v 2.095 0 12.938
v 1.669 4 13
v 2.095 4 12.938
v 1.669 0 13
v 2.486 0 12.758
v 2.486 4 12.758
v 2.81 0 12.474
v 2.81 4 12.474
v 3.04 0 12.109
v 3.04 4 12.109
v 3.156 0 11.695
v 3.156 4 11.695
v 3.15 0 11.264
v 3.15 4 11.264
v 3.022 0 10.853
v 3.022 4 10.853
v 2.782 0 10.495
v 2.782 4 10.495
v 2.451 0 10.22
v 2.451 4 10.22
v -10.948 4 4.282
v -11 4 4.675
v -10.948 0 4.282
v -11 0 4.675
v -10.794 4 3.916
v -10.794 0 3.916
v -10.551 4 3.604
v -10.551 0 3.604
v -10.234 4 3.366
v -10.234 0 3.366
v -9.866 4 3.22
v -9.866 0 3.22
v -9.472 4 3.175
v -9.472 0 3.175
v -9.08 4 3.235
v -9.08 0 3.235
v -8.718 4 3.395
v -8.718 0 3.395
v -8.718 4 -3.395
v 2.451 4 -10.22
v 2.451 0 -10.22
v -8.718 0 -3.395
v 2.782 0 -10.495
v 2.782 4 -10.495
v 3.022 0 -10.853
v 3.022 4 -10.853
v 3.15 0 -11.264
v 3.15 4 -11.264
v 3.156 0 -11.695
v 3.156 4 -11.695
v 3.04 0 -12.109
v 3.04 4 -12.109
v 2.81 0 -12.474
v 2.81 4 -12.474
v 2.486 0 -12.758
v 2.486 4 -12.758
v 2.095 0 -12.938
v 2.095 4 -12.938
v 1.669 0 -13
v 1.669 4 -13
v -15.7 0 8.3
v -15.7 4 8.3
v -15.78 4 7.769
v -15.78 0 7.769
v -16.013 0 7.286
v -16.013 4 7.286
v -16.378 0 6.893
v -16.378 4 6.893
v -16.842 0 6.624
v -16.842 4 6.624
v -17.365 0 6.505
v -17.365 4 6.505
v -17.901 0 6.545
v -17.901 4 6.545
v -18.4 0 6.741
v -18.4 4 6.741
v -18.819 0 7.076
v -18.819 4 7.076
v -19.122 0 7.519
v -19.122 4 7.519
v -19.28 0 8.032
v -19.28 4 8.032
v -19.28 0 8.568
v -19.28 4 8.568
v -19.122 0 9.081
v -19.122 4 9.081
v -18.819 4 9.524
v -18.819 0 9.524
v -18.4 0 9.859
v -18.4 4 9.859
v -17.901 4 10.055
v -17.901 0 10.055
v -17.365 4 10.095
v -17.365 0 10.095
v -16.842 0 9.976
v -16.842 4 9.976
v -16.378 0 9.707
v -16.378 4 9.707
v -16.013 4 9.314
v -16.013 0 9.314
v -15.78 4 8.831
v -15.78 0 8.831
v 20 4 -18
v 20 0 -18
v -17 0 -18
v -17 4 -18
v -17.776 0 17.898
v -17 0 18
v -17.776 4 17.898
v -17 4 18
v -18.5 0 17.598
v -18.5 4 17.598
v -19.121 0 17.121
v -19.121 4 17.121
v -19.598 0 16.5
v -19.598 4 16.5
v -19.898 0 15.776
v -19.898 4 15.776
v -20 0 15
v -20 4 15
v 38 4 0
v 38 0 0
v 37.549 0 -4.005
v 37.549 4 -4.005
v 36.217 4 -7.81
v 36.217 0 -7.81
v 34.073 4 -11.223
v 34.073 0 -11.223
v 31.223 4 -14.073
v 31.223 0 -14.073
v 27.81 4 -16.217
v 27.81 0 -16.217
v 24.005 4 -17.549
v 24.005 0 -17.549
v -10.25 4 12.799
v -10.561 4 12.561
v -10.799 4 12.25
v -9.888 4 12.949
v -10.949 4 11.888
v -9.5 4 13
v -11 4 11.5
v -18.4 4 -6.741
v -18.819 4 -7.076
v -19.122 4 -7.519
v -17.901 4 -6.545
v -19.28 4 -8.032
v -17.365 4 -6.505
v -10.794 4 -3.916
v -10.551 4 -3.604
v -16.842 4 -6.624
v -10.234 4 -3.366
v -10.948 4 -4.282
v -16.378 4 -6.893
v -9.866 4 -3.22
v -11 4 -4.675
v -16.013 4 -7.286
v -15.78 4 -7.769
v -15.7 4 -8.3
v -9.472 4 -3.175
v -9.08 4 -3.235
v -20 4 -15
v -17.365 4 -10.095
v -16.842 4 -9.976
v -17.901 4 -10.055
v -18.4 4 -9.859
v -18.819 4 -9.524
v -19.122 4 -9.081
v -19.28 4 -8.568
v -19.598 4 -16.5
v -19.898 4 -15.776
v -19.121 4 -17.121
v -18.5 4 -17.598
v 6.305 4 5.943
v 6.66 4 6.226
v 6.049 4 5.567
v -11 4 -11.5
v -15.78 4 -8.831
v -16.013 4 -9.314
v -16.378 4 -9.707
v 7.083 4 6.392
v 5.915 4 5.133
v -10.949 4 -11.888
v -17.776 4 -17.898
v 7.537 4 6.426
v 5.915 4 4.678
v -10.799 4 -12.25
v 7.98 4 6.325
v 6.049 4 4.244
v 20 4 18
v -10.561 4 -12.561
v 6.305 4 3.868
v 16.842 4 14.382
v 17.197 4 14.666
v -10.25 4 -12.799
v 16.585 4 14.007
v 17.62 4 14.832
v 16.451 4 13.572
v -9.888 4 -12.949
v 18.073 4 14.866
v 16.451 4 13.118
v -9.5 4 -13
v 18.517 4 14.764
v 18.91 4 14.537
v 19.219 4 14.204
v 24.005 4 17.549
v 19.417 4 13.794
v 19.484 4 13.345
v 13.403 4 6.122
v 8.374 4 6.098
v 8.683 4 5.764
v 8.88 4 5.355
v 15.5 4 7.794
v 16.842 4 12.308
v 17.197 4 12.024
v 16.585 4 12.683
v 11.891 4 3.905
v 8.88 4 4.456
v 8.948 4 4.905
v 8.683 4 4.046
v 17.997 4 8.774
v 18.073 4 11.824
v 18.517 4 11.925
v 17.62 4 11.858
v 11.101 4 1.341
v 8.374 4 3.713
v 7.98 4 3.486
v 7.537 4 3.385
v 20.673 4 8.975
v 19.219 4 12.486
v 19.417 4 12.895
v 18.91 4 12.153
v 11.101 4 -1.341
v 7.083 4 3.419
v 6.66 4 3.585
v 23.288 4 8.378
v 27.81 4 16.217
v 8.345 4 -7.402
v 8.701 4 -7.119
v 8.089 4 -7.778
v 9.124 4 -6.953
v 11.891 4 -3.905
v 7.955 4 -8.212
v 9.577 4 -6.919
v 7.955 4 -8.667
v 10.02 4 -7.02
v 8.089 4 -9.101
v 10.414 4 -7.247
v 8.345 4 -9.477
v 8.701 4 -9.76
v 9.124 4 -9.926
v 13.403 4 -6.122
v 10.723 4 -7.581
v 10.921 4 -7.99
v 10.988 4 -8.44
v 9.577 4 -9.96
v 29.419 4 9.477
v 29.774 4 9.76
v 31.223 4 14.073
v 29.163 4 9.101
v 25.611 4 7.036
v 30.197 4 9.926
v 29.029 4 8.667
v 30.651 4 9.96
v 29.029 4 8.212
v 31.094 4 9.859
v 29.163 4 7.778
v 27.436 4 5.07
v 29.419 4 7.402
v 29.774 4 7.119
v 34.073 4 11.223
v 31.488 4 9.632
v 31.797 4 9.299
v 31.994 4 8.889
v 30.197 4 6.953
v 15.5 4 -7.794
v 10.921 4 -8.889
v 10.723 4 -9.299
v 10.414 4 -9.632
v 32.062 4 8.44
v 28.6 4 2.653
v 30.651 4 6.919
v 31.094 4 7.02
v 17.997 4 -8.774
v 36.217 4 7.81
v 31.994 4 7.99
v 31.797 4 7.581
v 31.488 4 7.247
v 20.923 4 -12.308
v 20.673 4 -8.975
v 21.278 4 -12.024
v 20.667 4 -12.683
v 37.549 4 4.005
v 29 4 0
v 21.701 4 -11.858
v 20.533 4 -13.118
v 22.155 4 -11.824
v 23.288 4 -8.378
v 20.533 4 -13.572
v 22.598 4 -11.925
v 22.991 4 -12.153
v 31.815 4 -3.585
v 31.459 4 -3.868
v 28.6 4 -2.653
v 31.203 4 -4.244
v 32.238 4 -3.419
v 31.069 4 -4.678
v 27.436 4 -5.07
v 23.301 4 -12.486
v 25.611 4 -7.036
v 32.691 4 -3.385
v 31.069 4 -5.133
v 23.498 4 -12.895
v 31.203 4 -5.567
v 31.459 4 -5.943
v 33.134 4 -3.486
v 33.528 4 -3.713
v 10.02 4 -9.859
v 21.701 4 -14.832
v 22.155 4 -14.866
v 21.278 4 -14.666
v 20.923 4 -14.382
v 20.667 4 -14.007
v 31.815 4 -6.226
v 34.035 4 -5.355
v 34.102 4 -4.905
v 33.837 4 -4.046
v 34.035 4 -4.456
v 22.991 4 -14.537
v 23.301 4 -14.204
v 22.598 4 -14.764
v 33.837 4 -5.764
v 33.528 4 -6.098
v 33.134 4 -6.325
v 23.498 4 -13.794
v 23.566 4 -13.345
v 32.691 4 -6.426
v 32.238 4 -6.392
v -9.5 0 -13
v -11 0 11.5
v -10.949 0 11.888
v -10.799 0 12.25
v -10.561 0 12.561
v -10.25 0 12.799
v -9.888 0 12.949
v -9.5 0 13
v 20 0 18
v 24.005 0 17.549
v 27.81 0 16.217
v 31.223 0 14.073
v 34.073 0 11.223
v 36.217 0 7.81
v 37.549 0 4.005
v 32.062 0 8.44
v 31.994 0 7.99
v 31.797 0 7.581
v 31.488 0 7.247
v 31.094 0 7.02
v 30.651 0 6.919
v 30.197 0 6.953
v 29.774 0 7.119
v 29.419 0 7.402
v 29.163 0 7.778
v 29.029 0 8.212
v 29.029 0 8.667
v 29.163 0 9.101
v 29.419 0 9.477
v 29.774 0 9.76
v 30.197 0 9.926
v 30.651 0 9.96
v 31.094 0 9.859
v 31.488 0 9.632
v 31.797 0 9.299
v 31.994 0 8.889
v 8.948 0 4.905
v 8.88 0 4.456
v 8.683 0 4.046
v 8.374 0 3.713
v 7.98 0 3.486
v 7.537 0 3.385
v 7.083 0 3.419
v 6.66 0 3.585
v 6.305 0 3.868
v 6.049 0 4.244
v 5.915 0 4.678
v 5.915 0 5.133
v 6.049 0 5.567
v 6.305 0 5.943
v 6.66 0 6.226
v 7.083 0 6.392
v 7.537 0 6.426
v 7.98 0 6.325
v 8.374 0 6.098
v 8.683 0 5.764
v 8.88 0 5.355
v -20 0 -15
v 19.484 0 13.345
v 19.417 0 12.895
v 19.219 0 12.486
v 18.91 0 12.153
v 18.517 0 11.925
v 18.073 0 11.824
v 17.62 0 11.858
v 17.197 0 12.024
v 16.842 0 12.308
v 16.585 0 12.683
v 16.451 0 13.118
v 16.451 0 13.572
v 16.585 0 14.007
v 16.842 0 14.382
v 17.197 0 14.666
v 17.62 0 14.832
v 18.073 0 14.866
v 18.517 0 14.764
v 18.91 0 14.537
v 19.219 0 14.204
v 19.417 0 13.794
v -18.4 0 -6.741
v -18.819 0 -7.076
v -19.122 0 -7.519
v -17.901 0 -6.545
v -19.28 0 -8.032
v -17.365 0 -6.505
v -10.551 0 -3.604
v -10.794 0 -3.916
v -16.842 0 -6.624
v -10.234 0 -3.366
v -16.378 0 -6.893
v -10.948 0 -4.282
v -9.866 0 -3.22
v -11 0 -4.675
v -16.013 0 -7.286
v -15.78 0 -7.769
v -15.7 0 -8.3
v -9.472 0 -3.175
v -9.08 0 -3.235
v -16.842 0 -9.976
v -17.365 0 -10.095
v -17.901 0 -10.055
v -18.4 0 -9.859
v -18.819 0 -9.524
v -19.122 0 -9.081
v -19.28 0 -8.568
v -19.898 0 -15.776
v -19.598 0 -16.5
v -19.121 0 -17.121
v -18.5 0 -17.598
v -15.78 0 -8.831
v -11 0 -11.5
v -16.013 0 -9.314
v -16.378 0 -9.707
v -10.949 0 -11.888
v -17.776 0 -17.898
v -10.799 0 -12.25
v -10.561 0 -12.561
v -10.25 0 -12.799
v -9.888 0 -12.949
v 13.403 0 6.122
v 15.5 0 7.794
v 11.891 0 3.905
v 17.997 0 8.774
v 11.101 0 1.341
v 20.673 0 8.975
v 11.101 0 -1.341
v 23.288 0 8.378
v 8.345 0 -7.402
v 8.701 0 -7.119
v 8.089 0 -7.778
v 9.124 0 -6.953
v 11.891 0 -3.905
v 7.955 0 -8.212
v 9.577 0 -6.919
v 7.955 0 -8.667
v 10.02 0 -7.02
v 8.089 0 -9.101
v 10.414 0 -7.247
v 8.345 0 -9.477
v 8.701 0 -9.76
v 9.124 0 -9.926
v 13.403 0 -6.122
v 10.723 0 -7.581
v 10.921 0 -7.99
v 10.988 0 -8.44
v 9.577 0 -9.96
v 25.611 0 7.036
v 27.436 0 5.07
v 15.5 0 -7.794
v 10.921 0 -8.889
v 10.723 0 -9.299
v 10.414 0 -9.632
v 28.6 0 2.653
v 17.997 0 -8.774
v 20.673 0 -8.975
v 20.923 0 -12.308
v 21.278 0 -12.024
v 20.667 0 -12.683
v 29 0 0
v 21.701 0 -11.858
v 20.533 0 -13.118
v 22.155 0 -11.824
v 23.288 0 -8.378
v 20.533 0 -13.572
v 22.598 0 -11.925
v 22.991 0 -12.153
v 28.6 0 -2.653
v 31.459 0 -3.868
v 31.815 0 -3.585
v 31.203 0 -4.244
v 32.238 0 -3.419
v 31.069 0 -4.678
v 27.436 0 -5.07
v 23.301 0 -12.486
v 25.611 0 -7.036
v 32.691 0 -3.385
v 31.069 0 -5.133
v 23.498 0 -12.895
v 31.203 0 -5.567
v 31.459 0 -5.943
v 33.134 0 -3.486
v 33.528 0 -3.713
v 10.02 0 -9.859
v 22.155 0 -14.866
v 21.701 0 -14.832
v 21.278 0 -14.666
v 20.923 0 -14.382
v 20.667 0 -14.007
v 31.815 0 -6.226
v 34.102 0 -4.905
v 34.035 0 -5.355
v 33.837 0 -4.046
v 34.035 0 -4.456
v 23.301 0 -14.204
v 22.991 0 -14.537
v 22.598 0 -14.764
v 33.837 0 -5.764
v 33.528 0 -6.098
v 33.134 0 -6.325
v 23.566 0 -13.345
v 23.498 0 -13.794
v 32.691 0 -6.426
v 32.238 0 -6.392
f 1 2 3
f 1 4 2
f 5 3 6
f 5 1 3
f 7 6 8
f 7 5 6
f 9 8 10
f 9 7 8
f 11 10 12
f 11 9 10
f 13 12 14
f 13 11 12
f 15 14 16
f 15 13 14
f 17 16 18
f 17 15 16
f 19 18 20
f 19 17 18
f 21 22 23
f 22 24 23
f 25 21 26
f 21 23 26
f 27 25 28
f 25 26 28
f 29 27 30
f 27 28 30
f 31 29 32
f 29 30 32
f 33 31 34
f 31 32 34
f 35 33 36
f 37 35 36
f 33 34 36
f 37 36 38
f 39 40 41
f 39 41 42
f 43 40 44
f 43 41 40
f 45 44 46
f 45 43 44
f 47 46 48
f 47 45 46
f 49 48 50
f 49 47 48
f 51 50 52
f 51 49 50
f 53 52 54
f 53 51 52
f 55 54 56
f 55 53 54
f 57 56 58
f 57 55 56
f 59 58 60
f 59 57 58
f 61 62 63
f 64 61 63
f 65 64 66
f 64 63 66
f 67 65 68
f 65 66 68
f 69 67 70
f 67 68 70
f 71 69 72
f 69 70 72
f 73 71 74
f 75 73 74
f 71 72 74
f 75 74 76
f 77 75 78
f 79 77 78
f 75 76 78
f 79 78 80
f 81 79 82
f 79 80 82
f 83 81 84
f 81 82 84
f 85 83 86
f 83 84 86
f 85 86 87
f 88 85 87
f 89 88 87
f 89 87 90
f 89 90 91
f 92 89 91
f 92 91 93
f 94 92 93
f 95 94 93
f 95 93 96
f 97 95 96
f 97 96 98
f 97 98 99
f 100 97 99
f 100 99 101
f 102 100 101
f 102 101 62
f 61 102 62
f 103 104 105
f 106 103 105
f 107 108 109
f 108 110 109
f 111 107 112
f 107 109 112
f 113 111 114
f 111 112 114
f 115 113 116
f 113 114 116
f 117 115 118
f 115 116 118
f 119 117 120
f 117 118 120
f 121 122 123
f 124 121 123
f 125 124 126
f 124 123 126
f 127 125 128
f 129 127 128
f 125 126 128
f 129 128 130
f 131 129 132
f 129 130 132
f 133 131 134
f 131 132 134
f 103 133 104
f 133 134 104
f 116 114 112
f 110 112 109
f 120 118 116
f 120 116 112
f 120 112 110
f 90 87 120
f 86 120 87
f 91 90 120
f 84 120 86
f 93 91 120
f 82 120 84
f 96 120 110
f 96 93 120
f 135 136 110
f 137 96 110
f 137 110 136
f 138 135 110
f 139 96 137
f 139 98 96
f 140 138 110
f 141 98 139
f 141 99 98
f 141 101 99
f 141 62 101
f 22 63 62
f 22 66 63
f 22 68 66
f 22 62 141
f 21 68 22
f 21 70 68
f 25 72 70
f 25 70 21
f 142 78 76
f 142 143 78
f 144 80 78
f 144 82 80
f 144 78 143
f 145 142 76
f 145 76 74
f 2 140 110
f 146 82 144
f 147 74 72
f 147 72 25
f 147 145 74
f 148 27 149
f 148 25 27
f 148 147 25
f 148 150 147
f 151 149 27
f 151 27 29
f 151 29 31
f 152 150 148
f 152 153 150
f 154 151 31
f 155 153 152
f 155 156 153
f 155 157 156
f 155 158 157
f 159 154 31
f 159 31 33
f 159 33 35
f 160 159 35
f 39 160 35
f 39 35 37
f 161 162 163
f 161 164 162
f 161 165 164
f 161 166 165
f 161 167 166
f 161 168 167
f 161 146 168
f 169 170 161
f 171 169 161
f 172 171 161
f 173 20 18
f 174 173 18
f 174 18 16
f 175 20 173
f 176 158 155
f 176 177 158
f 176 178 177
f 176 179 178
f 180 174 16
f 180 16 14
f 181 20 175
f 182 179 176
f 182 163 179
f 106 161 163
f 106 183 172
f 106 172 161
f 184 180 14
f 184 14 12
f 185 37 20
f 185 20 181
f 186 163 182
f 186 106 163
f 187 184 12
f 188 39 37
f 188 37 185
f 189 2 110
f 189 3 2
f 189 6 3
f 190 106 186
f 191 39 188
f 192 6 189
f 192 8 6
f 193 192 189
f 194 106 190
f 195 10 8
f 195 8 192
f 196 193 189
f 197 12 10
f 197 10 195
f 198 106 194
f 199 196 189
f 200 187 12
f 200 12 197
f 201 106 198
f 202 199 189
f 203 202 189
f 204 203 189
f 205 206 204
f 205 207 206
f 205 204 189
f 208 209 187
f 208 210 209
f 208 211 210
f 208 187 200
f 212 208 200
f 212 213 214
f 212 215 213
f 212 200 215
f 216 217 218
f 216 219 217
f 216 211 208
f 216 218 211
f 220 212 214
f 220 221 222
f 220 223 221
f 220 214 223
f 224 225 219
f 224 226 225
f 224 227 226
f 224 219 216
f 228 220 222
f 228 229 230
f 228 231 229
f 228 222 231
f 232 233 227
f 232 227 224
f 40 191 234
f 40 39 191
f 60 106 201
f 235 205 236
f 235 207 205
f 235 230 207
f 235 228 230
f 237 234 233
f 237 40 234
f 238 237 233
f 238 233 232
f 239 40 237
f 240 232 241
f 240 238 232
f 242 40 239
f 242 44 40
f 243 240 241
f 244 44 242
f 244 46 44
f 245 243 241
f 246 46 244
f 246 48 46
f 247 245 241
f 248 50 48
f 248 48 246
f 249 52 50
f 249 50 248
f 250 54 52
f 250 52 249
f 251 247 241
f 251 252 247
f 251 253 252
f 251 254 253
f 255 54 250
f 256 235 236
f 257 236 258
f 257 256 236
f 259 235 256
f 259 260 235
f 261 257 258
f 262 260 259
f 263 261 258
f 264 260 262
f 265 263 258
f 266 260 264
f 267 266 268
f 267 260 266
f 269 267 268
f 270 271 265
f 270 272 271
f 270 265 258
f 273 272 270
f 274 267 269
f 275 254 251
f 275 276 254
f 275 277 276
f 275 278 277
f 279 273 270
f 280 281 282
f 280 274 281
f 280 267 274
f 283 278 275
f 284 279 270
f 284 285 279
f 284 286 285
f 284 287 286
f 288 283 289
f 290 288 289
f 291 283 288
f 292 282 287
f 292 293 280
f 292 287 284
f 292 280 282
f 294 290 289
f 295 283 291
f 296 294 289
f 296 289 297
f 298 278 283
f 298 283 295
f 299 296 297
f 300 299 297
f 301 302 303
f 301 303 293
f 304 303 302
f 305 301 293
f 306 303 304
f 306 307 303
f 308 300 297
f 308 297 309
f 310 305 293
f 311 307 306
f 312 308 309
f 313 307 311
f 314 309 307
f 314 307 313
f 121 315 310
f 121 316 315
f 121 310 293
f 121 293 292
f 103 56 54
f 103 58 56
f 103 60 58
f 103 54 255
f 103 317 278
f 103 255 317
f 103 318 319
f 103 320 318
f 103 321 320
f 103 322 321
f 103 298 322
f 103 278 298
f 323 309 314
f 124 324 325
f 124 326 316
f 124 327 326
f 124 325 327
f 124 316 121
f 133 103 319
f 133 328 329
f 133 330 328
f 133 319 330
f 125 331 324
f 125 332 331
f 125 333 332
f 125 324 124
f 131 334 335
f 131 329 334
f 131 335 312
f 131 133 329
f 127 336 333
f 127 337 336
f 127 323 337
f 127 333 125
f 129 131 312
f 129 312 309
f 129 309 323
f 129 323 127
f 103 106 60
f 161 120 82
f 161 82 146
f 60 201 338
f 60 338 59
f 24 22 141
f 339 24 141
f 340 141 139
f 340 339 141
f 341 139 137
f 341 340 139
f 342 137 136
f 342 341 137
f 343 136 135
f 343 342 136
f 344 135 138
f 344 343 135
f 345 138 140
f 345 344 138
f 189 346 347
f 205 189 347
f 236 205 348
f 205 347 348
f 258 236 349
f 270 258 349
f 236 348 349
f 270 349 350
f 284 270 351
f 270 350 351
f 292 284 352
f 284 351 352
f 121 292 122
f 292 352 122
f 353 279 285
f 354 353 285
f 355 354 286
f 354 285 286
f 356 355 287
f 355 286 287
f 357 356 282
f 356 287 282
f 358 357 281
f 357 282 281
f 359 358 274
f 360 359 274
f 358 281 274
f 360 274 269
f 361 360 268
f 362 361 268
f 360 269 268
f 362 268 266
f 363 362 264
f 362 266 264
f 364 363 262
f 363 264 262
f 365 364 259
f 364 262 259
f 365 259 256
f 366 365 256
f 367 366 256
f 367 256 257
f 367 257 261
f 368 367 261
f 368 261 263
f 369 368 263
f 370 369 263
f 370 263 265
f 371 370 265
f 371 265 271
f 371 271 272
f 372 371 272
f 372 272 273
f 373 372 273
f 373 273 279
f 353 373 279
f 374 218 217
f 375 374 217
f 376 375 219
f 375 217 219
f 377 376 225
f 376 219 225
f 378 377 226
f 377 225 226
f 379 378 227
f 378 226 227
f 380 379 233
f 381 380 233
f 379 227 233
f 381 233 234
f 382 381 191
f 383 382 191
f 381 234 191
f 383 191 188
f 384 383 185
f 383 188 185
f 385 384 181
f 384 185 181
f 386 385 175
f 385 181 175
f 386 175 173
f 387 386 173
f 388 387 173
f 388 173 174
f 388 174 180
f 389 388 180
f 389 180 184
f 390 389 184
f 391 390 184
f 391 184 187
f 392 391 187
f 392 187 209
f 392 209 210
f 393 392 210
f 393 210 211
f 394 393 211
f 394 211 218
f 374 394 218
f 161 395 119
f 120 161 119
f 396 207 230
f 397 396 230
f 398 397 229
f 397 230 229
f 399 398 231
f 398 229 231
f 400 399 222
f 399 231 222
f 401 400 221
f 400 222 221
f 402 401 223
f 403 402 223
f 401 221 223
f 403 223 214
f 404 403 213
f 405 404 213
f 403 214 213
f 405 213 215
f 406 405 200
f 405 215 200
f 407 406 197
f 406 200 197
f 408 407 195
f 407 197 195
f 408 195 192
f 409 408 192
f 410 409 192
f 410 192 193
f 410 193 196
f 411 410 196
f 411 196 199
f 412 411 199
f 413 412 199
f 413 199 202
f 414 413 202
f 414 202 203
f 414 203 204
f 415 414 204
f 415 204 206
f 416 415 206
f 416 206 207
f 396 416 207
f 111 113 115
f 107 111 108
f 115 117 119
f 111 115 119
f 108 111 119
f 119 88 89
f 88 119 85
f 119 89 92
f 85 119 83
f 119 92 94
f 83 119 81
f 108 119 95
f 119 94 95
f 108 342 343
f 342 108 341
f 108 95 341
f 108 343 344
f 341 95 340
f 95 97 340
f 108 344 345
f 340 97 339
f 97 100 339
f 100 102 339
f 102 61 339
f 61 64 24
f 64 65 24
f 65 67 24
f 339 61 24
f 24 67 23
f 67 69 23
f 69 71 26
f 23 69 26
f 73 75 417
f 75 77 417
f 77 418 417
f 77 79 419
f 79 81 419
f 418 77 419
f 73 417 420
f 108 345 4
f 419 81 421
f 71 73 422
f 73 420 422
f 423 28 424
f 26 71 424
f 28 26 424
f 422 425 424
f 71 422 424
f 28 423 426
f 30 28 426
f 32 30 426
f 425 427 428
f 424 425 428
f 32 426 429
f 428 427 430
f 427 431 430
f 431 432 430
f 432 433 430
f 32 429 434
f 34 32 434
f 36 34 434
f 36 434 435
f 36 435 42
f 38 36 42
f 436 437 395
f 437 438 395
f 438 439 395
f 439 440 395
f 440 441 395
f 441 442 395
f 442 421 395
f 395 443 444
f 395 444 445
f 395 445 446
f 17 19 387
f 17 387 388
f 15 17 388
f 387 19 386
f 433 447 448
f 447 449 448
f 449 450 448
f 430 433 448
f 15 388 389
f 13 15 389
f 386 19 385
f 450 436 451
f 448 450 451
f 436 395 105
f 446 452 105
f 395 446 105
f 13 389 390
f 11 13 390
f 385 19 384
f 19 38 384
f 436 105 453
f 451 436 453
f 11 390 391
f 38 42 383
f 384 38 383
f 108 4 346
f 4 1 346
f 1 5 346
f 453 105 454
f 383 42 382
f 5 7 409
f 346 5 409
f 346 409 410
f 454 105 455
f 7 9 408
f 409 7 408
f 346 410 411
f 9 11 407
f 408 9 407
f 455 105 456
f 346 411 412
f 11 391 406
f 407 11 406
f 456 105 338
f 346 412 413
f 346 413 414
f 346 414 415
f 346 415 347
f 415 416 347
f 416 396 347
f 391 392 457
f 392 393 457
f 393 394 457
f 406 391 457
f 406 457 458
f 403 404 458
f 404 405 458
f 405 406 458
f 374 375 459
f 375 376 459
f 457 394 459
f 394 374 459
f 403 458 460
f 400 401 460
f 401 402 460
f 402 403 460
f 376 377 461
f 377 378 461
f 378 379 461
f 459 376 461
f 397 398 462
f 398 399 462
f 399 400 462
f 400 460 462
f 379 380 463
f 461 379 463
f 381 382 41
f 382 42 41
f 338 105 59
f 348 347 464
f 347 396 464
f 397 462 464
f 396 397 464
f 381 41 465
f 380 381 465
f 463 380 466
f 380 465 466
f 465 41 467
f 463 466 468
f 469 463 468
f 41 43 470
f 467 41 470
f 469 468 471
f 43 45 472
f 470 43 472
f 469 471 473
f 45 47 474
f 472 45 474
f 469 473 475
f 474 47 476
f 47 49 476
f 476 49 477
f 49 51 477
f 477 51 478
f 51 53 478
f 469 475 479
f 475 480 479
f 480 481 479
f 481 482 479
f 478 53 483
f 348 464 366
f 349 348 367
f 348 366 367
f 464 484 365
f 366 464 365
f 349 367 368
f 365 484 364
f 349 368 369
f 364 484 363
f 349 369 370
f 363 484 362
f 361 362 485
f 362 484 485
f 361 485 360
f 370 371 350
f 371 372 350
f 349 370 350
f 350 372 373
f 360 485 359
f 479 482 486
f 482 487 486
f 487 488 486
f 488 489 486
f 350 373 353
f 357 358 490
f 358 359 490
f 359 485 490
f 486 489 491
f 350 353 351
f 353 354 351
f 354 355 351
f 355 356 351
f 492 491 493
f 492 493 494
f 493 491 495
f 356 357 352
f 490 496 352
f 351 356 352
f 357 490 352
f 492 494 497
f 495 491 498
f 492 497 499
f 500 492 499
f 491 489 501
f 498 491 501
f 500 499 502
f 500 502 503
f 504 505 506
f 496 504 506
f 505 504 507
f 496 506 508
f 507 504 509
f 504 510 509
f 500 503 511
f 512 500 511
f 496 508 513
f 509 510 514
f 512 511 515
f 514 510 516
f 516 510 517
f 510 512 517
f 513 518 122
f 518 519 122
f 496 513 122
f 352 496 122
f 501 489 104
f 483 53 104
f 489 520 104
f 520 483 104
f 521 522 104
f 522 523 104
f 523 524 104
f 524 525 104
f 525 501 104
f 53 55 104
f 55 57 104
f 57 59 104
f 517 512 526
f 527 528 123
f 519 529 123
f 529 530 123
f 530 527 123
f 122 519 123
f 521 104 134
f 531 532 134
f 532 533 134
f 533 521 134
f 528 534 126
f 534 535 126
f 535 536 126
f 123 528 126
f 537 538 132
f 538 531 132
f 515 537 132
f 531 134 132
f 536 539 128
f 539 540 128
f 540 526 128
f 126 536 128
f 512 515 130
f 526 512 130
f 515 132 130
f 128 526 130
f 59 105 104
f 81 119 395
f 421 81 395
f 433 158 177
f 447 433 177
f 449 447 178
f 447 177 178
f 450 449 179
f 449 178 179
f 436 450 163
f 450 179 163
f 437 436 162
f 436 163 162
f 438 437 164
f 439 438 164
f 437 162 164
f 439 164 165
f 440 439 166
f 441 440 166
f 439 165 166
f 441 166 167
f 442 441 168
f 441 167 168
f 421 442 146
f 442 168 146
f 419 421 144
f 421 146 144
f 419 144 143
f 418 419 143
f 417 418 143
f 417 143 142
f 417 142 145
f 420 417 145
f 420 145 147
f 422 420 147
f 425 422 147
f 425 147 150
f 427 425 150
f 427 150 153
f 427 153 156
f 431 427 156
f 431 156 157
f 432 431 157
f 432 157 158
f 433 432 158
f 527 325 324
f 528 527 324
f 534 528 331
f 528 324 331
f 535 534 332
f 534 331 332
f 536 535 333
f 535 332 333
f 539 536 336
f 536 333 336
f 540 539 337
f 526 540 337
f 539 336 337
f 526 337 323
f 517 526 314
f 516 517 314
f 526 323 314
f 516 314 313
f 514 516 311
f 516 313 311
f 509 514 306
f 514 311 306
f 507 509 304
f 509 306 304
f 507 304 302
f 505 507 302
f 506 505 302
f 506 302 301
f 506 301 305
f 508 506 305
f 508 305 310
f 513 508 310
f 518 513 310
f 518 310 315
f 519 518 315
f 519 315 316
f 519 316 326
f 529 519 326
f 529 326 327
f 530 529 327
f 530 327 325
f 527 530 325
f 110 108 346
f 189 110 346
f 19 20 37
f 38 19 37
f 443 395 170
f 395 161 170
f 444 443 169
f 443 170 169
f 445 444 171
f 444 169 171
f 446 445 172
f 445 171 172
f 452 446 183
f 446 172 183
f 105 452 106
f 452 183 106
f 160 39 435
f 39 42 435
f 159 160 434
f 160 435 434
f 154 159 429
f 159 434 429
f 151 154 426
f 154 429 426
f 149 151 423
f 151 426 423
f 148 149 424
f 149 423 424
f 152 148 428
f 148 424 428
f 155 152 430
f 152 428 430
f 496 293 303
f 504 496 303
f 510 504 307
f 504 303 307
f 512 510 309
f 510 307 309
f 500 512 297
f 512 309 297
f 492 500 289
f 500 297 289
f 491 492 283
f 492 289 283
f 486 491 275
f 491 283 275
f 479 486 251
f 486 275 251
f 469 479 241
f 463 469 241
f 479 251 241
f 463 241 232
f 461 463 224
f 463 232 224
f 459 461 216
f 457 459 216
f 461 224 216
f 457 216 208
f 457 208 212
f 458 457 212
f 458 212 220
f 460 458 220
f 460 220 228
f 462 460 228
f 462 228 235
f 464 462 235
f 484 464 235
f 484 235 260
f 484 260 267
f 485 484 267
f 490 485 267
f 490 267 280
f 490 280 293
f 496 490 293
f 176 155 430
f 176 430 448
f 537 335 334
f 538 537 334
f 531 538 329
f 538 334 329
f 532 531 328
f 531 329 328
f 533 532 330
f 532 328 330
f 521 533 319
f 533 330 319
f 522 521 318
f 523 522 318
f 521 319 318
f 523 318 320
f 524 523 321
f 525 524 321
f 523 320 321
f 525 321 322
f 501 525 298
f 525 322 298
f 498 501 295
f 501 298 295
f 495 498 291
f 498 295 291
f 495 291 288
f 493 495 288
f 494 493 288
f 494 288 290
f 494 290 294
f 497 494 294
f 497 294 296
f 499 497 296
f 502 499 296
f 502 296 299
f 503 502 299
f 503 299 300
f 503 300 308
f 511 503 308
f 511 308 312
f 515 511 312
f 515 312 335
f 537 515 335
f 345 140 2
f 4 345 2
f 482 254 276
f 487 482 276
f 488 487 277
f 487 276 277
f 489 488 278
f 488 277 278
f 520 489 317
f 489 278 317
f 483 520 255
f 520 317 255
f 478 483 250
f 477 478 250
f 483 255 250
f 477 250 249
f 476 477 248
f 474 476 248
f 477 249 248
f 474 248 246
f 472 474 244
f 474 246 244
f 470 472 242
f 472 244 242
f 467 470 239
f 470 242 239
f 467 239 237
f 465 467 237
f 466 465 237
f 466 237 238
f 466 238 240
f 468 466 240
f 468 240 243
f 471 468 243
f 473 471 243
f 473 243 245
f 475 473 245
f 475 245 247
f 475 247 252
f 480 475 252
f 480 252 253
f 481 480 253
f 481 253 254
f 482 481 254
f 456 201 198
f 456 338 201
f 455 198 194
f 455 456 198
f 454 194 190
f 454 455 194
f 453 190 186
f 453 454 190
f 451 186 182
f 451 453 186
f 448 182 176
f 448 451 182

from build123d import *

# Parameters (mm, degrees)
EXTRUDE_1_DEPTH        = 4
SKETCH_2_R             = 1.525
CUT_EXTRUDE_1_DEPTH    = 5
FILLET_1_R             = 3
SKETCH_3_R             = 1.8
CUT_EXTRUDE_5_DEPTH    = 5
CUT_EXTRUDE_3_DEPTH    = 5
FILLET_2_R             = 1.5
FILLET_2_OF_MIRROR_1_R = 1.5
SKETCH_5_R             = 9
CUT_EXTRUDE_4_DEPTH    = 5


with BuildPart() as part:
    # 草图1 → 凸台-拉伸1 (new body)
    with BuildSketch(Plane(origin=(0, 0, 0), x_dir=(1, 0, 0), z_dir=(0, 1, 0))):
        with BuildLine():
            Line((-20, 18), (-20, -18))
            Line((-20, -18), (20, -18))
            ThreePointArc((20, -18), (2, 0), (20, 18))
            Line((20, 18), (-20, 18))
        make_face()
        with BuildLine():
            ThreePointArc((20, 18), (2, 0), (20, -18))
            Line((20, -18), (20, 18))
        make_face()
        with BuildLine():
            Line((20, 18), (20, -18))
            ThreePointArc((20, -18), (32.727922061, -12.727922061), (38, 0))
            ThreePointArc((38, 0), (32.727922061, 12.727922061), (20, 18))
        make_face()
    extrude(amount=EXTRUDE_1_DEPTH)

    # 草图2 → 切除-拉伸1 (cut, through all)
    with BuildSketch(Plane(origin=(0, 4, 0), x_dir=(1, 0, 0), z_dir=(0, 1, 0))):
        with Locations((9.463257492, 8.439612392)):
            Circle(SKETCH_2_R)
        with Locations((7.422710017, -4.905280489)):
            Circle(SKETCH_2_R)
        with Locations((30.536742508, -8.439612392)):
            Circle(SKETCH_2_R)
        with Locations((17.959452524, -13.344892881)):
            Circle(SKETCH_2_R)
        with Locations((32.577289983, 4.905280489)):
            Circle(SKETCH_2_R)
        with Locations((22.040547476, 13.344892881)):
            Circle(SKETCH_2_R)
    extrude(amount=-CUT_EXTRUDE_1_DEPTH, mode=Mode.SUBTRACT)

    # 圆角1
    fillet_1_edges = [part.edges().sort_by_distance(p)[0] for p in [
        (-20, 2, 18),
        (-20, 2, -18),
    ]]
    fillet(fillet_1_edges, radius=FILLET_1_R)

    # 草图3 → 切除-拉伸5 (cut, through all)
    with BuildSketch(Plane(origin=(0, 4, 0), x_dir=(1, 0, 0), z_dir=(0, 1, 0))):
        with Locations((-17.5, -8.3)):
            Circle(SKETCH_3_R)
        with Locations((-17.5, 8.3)):
            Circle(SKETCH_3_R)
    extrude(amount=-CUT_EXTRUDE_5_DEPTH, mode=Mode.SUBTRACT)

    # 草图4 → 切除-拉伸3 (cut, through all)
    with BuildSketch(Plane(origin=(0, 4, 0), x_dir=(1, 0, 0), z_dir=(0, 1, 0))):
        Polygon((-11, 2), (-11, 13), (7, 13), align=None)
    cut_extrude_3 = extrude(amount=-CUT_EXTRUDE_3_DEPTH, mode=Mode.SUBTRACT)

    # 圆角2
    fillet_2_edges = [part.edges().sort_by_distance(p)[0] for p in [
        (-11, 2, -2),
        (-11, 2, -13),
        (7, 2, -13),
    ]]
    fillet(fillet_2_edges, radius=FILLET_2_R)

    # 镜向1: 切除-拉伸3 across plane
    add(cut_extrude_3.mirror(Plane.XY), mode=Mode.SUBTRACT)

    # 圆角2 of 镜向1
    fillet_2_of_mirror_1_edges = [part.edges().sort_by_distance(p)[0] for p in [
        (-11, 2, 2),
        (-11, 2, 13),
        (7, 2, 13),
    ]]
    fillet(fillet_2_of_mirror_1_edges, radius=FILLET_2_OF_MIRROR_1_R)

    # 草图5 → 切除-拉伸4 (cut, through all)
    with BuildSketch(Plane(origin=(0, 4, 0), x_dir=(1, 0, 0), z_dir=(0, 1, 0))):
        with Locations((20, 0)):
            Circle(SKETCH_5_R)
    extrude(amount=-CUT_EXTRUDE_4_DEPTH, mode=Mode.SUBTRACT)


solid = part.part
